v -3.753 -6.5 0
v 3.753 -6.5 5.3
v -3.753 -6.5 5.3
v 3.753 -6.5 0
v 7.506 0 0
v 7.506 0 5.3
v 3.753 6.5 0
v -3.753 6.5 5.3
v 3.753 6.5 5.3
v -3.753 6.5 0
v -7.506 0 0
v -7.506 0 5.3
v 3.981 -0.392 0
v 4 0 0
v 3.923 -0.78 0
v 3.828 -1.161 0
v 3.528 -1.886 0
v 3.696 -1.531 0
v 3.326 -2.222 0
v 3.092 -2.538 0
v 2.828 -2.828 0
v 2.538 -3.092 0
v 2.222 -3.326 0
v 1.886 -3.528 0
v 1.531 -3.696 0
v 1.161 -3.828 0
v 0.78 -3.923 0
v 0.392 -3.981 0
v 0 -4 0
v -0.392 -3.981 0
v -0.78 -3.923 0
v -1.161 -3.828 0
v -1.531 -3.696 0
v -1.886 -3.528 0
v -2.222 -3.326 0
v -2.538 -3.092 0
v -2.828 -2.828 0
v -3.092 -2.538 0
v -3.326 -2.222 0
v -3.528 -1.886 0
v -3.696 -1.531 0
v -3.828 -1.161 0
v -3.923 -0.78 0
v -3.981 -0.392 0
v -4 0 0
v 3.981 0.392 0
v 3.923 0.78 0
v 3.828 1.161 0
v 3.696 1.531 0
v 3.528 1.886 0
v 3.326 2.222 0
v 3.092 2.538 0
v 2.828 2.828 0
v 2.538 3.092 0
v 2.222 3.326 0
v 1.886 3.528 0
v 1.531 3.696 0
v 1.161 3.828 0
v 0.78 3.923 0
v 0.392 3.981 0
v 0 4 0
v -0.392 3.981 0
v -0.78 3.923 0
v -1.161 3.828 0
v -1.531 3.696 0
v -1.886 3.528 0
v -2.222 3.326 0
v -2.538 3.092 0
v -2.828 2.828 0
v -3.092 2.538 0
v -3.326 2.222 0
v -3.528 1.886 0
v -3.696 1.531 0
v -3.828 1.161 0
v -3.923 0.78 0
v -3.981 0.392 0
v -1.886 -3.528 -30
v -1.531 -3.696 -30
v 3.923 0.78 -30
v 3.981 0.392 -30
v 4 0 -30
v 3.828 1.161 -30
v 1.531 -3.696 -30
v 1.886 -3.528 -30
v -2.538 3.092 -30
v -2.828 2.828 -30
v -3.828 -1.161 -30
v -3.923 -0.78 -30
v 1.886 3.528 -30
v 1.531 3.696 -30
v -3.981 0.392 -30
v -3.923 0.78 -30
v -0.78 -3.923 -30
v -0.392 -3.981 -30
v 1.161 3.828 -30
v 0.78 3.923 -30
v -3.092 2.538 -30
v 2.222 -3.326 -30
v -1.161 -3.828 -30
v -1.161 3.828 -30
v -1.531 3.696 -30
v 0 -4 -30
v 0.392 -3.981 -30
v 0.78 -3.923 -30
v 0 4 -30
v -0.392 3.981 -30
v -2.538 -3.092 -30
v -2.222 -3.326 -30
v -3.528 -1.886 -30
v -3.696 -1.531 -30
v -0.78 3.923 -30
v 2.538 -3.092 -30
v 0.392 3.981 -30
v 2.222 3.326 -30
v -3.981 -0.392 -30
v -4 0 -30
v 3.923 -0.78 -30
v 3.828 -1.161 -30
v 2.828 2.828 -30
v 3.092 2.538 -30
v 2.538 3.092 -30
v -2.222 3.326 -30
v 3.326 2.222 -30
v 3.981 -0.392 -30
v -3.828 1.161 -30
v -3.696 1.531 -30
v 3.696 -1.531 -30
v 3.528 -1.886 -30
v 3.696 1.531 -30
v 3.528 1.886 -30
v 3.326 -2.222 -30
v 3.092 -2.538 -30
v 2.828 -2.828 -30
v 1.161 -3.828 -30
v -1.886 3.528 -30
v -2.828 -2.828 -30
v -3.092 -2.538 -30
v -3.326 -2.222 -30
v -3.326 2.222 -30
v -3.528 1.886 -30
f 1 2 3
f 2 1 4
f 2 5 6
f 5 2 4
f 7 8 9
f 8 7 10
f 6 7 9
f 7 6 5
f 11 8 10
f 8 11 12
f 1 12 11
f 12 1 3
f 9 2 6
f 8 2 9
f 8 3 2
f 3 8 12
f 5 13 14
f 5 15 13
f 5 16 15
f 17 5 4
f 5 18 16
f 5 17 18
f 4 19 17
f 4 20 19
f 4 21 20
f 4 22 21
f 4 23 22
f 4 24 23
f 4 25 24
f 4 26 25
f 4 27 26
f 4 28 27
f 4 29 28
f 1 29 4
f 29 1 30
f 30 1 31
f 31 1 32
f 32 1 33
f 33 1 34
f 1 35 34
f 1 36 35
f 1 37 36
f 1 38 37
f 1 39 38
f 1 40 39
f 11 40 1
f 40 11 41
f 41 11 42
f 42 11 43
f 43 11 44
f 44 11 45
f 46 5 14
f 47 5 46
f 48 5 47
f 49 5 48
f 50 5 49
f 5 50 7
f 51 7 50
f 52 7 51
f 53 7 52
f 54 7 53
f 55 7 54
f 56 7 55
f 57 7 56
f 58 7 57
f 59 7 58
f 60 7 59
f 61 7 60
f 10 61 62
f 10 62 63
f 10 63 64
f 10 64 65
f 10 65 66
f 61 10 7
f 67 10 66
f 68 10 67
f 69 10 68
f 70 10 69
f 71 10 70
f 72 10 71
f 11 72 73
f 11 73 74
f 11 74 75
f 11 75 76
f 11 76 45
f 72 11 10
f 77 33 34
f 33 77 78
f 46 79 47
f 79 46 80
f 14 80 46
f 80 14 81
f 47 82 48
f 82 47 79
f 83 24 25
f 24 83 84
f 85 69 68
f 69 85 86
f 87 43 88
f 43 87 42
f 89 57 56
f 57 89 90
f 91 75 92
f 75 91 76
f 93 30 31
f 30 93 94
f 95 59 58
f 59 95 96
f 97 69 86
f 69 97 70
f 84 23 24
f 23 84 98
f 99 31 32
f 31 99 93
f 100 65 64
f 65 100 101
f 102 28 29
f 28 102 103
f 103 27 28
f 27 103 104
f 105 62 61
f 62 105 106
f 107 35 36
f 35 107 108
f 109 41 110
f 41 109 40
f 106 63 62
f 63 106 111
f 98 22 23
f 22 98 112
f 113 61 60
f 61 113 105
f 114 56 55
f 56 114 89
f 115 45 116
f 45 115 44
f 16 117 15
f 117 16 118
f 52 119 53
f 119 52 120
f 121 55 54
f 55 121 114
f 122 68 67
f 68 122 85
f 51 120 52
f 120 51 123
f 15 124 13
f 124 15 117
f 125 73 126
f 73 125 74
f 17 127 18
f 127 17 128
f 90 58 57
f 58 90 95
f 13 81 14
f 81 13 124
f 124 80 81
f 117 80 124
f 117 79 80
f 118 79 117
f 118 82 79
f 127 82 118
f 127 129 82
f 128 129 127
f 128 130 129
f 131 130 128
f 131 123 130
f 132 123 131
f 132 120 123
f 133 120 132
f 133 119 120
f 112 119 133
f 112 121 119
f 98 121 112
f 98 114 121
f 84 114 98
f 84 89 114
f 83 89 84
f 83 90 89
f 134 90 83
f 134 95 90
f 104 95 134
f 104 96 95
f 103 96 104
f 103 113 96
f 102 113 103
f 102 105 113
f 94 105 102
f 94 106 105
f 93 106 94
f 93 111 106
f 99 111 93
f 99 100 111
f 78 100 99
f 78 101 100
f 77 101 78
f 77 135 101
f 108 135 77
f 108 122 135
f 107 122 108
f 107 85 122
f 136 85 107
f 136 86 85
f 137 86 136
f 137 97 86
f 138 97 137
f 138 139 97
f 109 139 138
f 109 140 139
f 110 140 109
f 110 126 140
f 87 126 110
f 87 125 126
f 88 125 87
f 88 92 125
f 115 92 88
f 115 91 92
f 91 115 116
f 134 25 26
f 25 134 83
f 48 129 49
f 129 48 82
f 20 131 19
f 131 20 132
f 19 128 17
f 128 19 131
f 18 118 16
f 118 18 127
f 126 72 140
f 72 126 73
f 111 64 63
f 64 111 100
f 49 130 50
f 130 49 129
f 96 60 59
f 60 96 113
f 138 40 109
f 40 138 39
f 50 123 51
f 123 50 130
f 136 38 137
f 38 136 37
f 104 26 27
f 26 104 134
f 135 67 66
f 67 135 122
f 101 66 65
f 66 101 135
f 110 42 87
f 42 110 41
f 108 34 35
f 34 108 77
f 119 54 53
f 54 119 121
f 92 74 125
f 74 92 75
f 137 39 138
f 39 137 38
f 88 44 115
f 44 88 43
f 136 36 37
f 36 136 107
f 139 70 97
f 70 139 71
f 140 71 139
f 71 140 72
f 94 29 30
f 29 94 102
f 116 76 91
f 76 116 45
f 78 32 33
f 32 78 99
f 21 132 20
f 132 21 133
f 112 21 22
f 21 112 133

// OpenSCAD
// M8 六角ボルト
// 頭部: 対辺距離 13mm, 高さ 5.3mm
// シャンク: 直径 8mm, 長さ 30mm

across_flats = 13;
head_height = 5.3;
shank_diameter = 8;
shank_length = 30;

// 対辺距離から外接円半径を計算
head_radius = across_flats / 2 / cos(30);

module hex_bolt() {
    // 頭部(六角柱) z=0 から z=head_height へ
    cylinder(h = head_height, r = head_radius, $fn = 6);

    // シャンク(円柱) z=0 から z=-shank_length へ
    translate([0, 0, -shank_length])
        cylinder(h = shank_length, d = shank_diameter, $fn = 64);
}

hex_bolt();
